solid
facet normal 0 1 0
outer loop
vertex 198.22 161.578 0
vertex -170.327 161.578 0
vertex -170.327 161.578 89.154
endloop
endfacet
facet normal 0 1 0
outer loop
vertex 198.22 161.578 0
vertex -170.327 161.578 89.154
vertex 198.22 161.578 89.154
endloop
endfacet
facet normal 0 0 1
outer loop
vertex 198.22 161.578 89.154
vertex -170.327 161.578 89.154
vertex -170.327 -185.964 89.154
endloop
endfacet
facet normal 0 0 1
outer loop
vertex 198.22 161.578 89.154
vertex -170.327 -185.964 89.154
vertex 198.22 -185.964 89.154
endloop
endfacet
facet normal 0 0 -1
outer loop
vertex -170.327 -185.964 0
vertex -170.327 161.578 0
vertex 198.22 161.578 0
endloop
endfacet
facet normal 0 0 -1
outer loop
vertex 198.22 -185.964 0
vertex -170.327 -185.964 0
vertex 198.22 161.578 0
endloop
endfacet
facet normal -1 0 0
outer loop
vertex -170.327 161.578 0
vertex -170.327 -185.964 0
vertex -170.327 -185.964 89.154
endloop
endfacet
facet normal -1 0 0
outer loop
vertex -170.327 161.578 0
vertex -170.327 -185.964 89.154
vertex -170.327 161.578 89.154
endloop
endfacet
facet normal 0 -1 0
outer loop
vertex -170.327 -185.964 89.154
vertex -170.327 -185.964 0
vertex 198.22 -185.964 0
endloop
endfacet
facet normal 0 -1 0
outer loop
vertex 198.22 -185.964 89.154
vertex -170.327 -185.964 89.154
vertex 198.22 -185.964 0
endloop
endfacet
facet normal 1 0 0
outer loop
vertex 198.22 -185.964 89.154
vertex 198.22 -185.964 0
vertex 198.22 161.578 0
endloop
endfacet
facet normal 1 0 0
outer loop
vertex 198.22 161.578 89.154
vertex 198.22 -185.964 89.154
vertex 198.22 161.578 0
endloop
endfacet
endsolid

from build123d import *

# Parameters (mm, degrees)
F2_W     = 34.4924107194
F2_H     = 39.9694368243
F6_R     = 9.1678743737
F8_W     = 368.5471117496
F8_H     = 347.5418388844
F9_DEPTH = 89.154


with BuildPart() as f3:
    # F3: sweep along a path in F0
    with BuildLine(Plane.XY) as f3_path:
        Line((-37.1106676757, -57.3247820139), (0, 39.8538187146))
        Line((0, 39.8538187146), (-42.0641675591, 72.9140937328))
        Line((-42.0641675591, 72.9140937328), (-42.0641675591, 105.7876199484))
    # F2 (on line) → F3 (sweep)
    with BuildSketch(Plane(origin=(-23.8282636841, -62.3970806143, 0), x_dir=(-0.9341988082, 0.3567528371, 0), z_dir=(0.3567528371, 0.9341988082, 0))):
        with Locations((-17.2462053597, 19.9847184122)):
            Rectangle(F2_W, F2_H)
    sweep(path=f3_path.line, transition=Transition.RIGHT)

    # F7: sweep along a path in F4
    with BuildLine(Plane(origin=(0, 0, 0), x_dir=(-0.3567528371, -0.9341988082, 0), z_dir=(-0.9341988082, 0.3567528371, 0))) as f7_path:
        Line((0, 15.3567641973), (36.2190231681, 39.9694368243))
        Line((36.2190231681, 39.9694368243), (59.6153741626, 55.8684500313))
    # F6 (on line) → F7 (sweep, cut)
    with BuildSketch(Plane(origin=(-15.4680950091, -40.5050063247, 29.4639817913), x_dir=(0.9554756476, -0.2386174907, 0.1735741341), z_dir=(-0.2950699695, -0.7726750432, 0.5620560387))):
        with Locations((10.3273540735, 12.5466436148)):
            Circle(F6_R)
    sweep(path=f7_path.line, mode=Mode.SUBTRACT)

    # F8 (on Top) → F9 (join)
    with BuildSketch(Plane.XY):
        with Locations((13.9467567205, -12.1927708387)):
            Rectangle(F8_W, F8_H)
    extrude(amount=F9_DEPTH)


solid = f3.part
